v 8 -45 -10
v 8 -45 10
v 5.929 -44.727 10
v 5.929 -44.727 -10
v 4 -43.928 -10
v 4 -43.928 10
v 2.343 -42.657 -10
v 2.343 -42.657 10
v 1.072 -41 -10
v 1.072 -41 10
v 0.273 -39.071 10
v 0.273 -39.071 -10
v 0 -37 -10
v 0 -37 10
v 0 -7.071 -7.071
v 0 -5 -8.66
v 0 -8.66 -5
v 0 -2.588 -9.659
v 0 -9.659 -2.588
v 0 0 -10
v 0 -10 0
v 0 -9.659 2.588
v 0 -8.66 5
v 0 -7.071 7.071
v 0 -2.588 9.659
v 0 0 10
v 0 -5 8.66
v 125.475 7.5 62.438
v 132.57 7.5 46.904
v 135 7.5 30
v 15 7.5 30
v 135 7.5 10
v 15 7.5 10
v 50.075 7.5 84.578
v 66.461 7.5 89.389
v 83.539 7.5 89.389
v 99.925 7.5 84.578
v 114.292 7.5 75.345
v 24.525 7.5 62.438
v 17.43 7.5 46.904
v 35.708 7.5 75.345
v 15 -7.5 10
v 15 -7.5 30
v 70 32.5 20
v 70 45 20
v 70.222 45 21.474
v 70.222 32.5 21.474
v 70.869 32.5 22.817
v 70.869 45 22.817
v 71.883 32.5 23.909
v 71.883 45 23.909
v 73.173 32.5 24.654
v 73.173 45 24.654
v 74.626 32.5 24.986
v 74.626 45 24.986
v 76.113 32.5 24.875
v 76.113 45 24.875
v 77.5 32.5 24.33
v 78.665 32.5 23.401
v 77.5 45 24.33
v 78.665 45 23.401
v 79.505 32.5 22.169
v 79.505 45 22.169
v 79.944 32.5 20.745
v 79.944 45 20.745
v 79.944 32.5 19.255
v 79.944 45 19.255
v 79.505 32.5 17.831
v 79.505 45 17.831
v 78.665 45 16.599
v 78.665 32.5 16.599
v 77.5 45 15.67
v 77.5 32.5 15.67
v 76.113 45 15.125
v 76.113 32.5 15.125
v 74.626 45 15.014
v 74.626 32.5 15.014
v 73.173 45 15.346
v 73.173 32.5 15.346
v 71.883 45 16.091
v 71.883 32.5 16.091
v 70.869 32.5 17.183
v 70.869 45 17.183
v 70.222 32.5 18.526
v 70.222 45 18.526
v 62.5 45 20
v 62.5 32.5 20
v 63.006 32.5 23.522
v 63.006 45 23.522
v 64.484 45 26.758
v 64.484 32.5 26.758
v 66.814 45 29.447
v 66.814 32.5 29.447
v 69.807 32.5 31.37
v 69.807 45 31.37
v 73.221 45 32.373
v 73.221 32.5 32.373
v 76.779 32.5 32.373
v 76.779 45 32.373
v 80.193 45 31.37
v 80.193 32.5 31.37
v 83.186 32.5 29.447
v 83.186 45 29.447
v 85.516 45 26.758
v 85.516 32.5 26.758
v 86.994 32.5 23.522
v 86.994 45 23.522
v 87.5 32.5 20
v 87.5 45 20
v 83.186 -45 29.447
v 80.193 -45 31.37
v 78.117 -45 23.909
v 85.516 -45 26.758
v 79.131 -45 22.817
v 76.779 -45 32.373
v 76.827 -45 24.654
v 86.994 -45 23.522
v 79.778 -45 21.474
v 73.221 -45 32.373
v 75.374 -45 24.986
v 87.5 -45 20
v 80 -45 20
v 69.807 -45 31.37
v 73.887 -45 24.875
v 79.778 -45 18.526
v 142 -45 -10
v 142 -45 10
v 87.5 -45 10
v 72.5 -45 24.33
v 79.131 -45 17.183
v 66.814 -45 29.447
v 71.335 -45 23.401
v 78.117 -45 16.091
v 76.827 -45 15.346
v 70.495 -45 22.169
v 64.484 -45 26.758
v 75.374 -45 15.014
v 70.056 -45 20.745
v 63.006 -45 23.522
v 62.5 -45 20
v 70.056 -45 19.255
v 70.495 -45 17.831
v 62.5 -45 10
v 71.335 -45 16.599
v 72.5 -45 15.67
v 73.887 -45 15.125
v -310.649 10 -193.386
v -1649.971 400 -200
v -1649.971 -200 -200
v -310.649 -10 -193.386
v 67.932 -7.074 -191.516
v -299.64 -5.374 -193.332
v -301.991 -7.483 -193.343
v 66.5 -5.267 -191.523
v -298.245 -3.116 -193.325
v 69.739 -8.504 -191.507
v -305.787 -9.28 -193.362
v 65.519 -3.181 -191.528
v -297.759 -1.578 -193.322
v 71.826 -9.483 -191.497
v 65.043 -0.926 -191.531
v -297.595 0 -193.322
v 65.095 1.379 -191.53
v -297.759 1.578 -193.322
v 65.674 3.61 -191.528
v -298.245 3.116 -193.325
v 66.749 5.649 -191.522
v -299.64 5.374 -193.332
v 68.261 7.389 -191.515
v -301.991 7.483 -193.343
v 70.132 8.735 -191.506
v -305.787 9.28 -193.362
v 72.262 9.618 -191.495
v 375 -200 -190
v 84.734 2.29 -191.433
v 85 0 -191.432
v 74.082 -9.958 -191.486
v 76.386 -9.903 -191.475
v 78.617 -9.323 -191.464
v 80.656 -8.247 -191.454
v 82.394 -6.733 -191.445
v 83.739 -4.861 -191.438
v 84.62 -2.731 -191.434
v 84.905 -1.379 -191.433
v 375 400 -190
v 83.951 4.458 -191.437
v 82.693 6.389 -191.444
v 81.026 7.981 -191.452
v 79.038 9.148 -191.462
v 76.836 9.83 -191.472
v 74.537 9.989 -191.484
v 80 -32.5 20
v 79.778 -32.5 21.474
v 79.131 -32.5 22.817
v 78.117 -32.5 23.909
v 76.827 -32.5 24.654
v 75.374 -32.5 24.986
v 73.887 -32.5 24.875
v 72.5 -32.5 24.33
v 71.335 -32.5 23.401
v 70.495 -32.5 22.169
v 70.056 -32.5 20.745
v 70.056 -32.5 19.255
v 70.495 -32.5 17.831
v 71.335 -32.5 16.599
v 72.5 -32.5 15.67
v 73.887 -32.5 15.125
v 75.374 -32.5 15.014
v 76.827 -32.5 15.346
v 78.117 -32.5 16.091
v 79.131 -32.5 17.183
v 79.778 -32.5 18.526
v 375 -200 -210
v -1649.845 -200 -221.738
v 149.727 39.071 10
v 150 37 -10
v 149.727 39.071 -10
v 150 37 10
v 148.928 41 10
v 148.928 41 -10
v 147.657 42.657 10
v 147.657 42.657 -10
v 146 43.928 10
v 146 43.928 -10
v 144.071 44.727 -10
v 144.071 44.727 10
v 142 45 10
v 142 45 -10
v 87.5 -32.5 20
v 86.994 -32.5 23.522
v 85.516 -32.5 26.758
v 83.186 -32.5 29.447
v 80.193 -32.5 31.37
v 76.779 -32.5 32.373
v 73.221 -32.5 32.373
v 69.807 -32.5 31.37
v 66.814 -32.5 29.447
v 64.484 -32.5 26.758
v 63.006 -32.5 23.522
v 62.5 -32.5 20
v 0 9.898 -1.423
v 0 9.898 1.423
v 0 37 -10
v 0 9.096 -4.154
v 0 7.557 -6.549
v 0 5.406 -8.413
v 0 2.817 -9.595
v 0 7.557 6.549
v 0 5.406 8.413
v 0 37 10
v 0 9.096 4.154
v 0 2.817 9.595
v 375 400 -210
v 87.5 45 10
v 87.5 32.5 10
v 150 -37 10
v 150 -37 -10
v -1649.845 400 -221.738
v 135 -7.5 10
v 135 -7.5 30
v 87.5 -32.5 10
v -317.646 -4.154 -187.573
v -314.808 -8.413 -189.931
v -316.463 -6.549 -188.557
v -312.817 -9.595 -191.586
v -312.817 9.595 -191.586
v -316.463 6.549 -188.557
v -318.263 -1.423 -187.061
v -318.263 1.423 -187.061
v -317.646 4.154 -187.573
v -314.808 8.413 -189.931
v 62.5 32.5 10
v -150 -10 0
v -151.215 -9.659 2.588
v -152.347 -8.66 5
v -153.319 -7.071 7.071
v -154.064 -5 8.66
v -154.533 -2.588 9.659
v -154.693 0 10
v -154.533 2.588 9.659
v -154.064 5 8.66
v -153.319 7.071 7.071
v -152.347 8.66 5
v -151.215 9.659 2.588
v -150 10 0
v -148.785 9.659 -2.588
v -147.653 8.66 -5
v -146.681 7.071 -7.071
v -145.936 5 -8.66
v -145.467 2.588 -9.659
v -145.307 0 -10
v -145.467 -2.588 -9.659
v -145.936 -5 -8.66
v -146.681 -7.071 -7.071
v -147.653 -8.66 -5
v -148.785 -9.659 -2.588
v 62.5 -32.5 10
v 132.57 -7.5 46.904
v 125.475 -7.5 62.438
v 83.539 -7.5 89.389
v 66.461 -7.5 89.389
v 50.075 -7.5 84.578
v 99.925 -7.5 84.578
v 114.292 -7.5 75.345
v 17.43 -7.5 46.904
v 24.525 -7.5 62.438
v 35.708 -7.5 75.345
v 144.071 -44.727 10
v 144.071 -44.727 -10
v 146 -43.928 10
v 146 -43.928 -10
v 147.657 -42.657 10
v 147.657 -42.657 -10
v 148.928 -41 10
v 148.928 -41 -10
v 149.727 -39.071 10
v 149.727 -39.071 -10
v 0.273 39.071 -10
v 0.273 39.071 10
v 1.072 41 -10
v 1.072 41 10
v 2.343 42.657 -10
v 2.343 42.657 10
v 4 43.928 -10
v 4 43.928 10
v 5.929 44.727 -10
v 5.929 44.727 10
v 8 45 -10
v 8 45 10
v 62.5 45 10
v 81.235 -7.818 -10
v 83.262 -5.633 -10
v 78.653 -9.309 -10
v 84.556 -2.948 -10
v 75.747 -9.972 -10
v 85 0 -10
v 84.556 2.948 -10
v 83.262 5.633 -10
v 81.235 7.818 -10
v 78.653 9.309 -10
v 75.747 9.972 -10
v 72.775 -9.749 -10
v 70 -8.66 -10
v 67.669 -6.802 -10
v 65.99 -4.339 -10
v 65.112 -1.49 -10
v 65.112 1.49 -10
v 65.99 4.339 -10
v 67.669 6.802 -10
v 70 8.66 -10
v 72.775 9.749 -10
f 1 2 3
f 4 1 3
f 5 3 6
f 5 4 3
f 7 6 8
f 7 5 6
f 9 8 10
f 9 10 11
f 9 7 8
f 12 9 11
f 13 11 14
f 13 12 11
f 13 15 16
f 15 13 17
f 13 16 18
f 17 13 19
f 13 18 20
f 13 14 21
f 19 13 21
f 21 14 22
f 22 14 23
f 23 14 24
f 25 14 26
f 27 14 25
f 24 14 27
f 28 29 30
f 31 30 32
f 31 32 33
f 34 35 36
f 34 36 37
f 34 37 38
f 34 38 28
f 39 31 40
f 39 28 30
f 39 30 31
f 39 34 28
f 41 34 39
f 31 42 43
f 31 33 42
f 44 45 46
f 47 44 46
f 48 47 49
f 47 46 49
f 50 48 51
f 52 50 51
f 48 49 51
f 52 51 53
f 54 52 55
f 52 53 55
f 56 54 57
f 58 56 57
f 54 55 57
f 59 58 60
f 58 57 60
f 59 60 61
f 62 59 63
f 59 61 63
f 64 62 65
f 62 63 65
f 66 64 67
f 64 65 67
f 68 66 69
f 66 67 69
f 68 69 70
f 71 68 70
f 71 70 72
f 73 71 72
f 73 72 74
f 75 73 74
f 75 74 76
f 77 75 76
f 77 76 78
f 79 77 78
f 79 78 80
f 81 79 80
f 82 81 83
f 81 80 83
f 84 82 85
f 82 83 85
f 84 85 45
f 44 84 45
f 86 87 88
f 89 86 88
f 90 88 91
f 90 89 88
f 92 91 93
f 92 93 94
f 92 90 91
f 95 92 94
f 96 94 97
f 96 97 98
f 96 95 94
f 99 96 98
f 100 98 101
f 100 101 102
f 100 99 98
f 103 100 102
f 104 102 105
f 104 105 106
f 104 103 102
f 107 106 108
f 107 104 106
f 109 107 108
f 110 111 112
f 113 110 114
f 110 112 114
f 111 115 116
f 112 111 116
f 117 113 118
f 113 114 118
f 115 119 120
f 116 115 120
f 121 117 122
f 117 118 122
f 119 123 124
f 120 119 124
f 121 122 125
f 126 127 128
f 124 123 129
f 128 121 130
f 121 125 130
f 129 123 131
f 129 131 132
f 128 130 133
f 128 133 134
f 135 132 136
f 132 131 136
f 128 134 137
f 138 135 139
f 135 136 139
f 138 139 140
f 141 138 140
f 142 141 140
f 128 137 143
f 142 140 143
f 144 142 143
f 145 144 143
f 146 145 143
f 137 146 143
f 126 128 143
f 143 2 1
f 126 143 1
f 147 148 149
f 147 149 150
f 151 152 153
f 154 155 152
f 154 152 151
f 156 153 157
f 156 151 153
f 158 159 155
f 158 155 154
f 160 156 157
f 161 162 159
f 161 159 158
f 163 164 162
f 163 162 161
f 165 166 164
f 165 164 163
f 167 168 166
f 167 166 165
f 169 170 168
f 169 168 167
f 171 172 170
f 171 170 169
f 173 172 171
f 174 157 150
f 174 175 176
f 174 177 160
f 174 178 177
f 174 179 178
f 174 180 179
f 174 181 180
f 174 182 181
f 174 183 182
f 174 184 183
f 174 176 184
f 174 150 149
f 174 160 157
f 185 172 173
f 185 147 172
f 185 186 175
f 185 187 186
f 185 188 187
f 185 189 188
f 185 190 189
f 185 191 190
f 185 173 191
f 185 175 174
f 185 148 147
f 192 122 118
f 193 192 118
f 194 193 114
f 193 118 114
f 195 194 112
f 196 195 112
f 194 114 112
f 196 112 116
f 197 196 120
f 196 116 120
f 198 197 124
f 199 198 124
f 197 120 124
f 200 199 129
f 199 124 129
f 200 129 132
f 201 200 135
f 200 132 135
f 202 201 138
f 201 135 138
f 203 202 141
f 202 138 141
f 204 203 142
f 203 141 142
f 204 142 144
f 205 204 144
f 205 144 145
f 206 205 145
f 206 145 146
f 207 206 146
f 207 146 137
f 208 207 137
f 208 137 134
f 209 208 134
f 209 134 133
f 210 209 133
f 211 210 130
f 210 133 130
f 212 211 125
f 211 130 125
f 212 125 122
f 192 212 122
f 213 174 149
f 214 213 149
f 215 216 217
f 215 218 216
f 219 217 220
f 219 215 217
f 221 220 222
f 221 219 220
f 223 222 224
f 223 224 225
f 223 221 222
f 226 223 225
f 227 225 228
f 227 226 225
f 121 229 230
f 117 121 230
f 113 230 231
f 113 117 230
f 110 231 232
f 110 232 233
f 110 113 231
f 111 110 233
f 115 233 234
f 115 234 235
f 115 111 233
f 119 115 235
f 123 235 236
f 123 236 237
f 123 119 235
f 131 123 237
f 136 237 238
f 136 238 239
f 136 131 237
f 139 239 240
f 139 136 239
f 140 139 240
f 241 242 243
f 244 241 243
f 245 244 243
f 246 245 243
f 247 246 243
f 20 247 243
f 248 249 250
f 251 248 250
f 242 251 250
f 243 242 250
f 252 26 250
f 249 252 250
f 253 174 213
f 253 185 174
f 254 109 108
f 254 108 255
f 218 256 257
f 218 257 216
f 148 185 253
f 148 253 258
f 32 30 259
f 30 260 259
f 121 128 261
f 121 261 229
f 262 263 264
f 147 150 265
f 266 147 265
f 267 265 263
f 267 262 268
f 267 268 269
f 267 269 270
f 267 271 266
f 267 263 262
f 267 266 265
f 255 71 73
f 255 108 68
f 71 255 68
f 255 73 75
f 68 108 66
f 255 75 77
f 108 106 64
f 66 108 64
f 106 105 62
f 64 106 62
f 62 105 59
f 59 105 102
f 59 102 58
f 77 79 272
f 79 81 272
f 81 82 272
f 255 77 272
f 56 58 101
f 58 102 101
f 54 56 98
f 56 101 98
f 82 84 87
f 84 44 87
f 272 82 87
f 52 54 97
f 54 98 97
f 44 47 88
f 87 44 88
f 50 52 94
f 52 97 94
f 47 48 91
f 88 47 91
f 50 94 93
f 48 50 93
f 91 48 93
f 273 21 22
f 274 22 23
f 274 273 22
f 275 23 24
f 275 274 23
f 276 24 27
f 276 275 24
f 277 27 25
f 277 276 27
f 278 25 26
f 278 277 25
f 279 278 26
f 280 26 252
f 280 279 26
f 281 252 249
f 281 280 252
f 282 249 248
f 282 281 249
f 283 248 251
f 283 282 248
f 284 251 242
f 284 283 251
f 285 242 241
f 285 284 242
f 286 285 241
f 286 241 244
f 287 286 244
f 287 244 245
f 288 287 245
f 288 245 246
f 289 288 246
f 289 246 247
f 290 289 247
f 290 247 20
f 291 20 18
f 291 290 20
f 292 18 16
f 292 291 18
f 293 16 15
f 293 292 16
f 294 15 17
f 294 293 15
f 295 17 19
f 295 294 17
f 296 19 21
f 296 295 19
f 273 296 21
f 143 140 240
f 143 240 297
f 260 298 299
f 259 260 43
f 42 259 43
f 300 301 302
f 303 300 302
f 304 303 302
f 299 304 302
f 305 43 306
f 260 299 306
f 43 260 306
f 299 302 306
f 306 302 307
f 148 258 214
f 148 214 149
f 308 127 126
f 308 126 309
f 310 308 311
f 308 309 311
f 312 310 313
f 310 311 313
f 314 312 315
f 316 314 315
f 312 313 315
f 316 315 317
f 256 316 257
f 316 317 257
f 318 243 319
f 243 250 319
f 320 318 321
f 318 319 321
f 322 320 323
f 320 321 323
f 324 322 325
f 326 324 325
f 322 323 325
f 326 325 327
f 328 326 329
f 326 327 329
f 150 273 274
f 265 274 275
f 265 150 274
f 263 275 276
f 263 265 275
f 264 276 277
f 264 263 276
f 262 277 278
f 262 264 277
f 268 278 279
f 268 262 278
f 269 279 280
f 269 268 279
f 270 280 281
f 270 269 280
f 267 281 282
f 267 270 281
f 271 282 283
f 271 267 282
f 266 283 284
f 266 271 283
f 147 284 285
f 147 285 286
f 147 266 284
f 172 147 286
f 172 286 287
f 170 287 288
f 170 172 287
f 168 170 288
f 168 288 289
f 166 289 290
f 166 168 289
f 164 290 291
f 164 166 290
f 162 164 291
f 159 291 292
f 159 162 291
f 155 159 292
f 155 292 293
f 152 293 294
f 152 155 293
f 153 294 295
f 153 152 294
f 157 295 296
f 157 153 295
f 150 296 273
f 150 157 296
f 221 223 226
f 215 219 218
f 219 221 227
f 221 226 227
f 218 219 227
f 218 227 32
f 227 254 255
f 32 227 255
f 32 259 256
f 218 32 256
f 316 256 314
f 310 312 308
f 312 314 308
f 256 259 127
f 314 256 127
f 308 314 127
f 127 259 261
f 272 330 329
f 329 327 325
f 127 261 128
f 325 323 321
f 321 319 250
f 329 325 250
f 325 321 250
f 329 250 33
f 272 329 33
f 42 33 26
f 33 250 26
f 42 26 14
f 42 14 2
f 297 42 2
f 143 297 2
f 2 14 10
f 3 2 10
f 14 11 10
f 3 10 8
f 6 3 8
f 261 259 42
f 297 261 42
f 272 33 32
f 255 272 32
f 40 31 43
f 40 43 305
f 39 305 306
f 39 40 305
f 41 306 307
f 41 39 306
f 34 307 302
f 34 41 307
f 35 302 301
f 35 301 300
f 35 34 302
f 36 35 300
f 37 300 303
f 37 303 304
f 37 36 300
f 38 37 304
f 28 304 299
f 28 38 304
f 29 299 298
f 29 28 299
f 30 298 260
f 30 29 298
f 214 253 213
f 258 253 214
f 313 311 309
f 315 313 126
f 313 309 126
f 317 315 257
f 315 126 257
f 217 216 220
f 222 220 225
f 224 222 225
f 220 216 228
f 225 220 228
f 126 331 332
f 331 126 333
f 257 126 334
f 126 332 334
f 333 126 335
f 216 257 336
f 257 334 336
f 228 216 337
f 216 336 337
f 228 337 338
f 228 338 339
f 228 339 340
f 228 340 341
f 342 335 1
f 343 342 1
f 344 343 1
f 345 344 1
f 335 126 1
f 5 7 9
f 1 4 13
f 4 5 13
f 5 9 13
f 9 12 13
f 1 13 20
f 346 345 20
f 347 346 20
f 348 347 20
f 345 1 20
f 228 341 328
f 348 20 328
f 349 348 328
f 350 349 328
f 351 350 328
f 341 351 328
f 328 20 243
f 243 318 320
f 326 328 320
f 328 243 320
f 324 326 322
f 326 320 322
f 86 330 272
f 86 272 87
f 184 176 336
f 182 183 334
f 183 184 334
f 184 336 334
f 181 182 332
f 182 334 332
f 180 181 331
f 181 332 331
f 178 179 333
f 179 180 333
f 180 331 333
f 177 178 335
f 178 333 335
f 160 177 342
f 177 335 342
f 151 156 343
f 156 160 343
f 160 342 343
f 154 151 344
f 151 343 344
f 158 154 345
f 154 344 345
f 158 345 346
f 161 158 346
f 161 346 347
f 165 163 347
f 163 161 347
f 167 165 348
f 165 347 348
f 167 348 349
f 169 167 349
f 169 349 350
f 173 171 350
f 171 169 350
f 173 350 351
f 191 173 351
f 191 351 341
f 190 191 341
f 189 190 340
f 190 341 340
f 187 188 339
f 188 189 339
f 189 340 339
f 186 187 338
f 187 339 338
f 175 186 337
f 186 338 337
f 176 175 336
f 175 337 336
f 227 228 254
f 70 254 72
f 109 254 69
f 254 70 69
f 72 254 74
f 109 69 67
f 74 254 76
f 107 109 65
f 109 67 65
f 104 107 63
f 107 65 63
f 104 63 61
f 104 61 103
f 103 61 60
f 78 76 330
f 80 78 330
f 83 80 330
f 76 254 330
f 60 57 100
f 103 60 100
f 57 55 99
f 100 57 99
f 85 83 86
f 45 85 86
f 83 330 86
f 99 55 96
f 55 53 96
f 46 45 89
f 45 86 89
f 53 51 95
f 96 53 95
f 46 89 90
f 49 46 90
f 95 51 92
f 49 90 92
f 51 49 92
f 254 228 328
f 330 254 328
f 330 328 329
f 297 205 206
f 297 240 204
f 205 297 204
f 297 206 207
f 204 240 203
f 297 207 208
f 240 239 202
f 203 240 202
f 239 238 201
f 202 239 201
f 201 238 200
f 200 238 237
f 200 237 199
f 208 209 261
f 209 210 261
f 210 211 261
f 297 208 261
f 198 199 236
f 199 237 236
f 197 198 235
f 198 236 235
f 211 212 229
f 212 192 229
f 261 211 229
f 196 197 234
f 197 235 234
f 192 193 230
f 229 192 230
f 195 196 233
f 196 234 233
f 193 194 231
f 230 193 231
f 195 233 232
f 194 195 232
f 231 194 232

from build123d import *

# Parameters (mm, degrees)
F1_DEPTH       = 150
F3_R           = 5
F4_DEPTH       = 12.5
F6_R           = 5
F7_DEPTH       = 12.5
F10_DEPTH      = 7.5
F10_DEPTH_BACK = 7.5
F13_R          = 10
F15_DEPTH      = 400
F15_DEPTH_BACK = 200
F18_DEPTH      = 190
F19_R          = 8


with BuildPart() as f1:
    # F0 (on Right) → F1 (new body)
    with BuildSketch(Plane.YZ):
        Polygon((45, 10), (0, 10), (-45, 10), (-45, -10), (45, -10), align=None)
    extrude(amount=F1_DEPTH)

    # F3 (on offset) → F4 (join)
    with BuildSketch(Plane.XZ.offset(45)):
        with BuildLine():
            Line((87.5, 10), (87.5, 20))
            ThreePointArc((87.5, 20), (75, 32.5), (62.5, 20))
            Line((62.5, 20), (62.5, 10))
            Line((62.5, 10), (75, 10))
            Line((75, 10), (87.5, 10))
        make_face()
        with Locations((75, 20)):
            Circle(F3_R, mode=Mode.SUBTRACT)
    extrude(amount=-F4_DEPTH)

    # F6 (on offset) → F7 (join)
    with BuildSketch(Plane(origin=(0, 45, 0), x_dir=(-1, 0, 0), z_dir=(0, 1, 0))):
        with BuildLine():
            Line((-62.5, 10), (-62.5, 20))
            ThreePointArc((-62.5, 20), (-75, 32.5), (-87.5, 20))
            Line((-87.5, 20), (-87.5, 10))
            Line((-87.5, 10), (-75, 10))
            Line((-75, 10), (-62.5, 10))
        make_face()
        with Locations((-75, 20)):
            Circle(F6_R, mode=Mode.SUBTRACT)
    extrude(amount=-F7_DEPTH)

    # F9 (on offset) → F10 (join, two sides)
    with BuildSketch(Plane(origin=(0, 0, 0), x_dir=(-1, 0, 0), z_dir=(0, 1, 0))) as f10_sk:
        with BuildLine():
            Line((-15, 10), (-15, 30))
            ThreePointArc((-15, 30), (-75, 90), (-135, 30))
            Line((-135, 30), (-135, 10))
            Line((-135, 10), (-75, 10))
            Line((-75, 10), (-15, 10))
        make_face()
    extrude(amount=F10_DEPTH)
    extrude(f10_sk.sketch, amount=-F10_DEPTH_BACK)

    # F14: sweep along a path in F11
    with BuildLine(Plane(origin=(0, 0, 0), x_dir=(-1, 0, 0), z_dir=(0, 1, 0))) as f14_path:
        Line((0, 0), (150, 0))
        Line((150, 0), (310.6493984302, -193.3859714218))
    # F13 (on offset) → F14 (sweep)
    with BuildSketch(Plane(origin=(0, 0, 0), x_dir=(0, -1, 0), z_dir=(-1, 0, 0))):
        Circle(F13_R)
    sweep(path=f14_path.line, transition=Transition.RIGHT)

    # F11 (on offset) → F15 (join, two sides)
    with BuildSketch(Plane(origin=(0, 0, 0), x_dir=(-1, 0, 0), z_dir=(0, 1, 0))) as f15_sk:
        Polygon((310.6493984302, -193.3859714218), (-375, -190), (-375, -210), (1649.8449922529, -221.7384290839), (1649.9710142492, -200), align=None)
    extrude(amount=F15_DEPTH)
    extrude(f15_sk.sketch, amount=-F15_DEPTH_BACK)

    # F17 (on offset) → F18 (join)
    with BuildSketch(Plane(origin=(0, 0, -10), x_dir=(1, 0, 0), z_dir=(0, 0, -1))):
        with BuildLine():
            ThreePointArc((65, 0), (75, -10), (85, 0))
            ThreePointArc((85, 0), (75, 10), (65, 0))
        make_face()
    extrude(amount=F18_DEPTH)

    # F19
    f19_edges = [f1.edges().sort_by_distance(p)[0] for p in [
        (0, -45, 0),
        (150, -45, 0),
        (150, 45, 0),
        (0, 45, 0),
    ]]
    fillet(f19_edges, radius=F19_R)


solid = f1.part
